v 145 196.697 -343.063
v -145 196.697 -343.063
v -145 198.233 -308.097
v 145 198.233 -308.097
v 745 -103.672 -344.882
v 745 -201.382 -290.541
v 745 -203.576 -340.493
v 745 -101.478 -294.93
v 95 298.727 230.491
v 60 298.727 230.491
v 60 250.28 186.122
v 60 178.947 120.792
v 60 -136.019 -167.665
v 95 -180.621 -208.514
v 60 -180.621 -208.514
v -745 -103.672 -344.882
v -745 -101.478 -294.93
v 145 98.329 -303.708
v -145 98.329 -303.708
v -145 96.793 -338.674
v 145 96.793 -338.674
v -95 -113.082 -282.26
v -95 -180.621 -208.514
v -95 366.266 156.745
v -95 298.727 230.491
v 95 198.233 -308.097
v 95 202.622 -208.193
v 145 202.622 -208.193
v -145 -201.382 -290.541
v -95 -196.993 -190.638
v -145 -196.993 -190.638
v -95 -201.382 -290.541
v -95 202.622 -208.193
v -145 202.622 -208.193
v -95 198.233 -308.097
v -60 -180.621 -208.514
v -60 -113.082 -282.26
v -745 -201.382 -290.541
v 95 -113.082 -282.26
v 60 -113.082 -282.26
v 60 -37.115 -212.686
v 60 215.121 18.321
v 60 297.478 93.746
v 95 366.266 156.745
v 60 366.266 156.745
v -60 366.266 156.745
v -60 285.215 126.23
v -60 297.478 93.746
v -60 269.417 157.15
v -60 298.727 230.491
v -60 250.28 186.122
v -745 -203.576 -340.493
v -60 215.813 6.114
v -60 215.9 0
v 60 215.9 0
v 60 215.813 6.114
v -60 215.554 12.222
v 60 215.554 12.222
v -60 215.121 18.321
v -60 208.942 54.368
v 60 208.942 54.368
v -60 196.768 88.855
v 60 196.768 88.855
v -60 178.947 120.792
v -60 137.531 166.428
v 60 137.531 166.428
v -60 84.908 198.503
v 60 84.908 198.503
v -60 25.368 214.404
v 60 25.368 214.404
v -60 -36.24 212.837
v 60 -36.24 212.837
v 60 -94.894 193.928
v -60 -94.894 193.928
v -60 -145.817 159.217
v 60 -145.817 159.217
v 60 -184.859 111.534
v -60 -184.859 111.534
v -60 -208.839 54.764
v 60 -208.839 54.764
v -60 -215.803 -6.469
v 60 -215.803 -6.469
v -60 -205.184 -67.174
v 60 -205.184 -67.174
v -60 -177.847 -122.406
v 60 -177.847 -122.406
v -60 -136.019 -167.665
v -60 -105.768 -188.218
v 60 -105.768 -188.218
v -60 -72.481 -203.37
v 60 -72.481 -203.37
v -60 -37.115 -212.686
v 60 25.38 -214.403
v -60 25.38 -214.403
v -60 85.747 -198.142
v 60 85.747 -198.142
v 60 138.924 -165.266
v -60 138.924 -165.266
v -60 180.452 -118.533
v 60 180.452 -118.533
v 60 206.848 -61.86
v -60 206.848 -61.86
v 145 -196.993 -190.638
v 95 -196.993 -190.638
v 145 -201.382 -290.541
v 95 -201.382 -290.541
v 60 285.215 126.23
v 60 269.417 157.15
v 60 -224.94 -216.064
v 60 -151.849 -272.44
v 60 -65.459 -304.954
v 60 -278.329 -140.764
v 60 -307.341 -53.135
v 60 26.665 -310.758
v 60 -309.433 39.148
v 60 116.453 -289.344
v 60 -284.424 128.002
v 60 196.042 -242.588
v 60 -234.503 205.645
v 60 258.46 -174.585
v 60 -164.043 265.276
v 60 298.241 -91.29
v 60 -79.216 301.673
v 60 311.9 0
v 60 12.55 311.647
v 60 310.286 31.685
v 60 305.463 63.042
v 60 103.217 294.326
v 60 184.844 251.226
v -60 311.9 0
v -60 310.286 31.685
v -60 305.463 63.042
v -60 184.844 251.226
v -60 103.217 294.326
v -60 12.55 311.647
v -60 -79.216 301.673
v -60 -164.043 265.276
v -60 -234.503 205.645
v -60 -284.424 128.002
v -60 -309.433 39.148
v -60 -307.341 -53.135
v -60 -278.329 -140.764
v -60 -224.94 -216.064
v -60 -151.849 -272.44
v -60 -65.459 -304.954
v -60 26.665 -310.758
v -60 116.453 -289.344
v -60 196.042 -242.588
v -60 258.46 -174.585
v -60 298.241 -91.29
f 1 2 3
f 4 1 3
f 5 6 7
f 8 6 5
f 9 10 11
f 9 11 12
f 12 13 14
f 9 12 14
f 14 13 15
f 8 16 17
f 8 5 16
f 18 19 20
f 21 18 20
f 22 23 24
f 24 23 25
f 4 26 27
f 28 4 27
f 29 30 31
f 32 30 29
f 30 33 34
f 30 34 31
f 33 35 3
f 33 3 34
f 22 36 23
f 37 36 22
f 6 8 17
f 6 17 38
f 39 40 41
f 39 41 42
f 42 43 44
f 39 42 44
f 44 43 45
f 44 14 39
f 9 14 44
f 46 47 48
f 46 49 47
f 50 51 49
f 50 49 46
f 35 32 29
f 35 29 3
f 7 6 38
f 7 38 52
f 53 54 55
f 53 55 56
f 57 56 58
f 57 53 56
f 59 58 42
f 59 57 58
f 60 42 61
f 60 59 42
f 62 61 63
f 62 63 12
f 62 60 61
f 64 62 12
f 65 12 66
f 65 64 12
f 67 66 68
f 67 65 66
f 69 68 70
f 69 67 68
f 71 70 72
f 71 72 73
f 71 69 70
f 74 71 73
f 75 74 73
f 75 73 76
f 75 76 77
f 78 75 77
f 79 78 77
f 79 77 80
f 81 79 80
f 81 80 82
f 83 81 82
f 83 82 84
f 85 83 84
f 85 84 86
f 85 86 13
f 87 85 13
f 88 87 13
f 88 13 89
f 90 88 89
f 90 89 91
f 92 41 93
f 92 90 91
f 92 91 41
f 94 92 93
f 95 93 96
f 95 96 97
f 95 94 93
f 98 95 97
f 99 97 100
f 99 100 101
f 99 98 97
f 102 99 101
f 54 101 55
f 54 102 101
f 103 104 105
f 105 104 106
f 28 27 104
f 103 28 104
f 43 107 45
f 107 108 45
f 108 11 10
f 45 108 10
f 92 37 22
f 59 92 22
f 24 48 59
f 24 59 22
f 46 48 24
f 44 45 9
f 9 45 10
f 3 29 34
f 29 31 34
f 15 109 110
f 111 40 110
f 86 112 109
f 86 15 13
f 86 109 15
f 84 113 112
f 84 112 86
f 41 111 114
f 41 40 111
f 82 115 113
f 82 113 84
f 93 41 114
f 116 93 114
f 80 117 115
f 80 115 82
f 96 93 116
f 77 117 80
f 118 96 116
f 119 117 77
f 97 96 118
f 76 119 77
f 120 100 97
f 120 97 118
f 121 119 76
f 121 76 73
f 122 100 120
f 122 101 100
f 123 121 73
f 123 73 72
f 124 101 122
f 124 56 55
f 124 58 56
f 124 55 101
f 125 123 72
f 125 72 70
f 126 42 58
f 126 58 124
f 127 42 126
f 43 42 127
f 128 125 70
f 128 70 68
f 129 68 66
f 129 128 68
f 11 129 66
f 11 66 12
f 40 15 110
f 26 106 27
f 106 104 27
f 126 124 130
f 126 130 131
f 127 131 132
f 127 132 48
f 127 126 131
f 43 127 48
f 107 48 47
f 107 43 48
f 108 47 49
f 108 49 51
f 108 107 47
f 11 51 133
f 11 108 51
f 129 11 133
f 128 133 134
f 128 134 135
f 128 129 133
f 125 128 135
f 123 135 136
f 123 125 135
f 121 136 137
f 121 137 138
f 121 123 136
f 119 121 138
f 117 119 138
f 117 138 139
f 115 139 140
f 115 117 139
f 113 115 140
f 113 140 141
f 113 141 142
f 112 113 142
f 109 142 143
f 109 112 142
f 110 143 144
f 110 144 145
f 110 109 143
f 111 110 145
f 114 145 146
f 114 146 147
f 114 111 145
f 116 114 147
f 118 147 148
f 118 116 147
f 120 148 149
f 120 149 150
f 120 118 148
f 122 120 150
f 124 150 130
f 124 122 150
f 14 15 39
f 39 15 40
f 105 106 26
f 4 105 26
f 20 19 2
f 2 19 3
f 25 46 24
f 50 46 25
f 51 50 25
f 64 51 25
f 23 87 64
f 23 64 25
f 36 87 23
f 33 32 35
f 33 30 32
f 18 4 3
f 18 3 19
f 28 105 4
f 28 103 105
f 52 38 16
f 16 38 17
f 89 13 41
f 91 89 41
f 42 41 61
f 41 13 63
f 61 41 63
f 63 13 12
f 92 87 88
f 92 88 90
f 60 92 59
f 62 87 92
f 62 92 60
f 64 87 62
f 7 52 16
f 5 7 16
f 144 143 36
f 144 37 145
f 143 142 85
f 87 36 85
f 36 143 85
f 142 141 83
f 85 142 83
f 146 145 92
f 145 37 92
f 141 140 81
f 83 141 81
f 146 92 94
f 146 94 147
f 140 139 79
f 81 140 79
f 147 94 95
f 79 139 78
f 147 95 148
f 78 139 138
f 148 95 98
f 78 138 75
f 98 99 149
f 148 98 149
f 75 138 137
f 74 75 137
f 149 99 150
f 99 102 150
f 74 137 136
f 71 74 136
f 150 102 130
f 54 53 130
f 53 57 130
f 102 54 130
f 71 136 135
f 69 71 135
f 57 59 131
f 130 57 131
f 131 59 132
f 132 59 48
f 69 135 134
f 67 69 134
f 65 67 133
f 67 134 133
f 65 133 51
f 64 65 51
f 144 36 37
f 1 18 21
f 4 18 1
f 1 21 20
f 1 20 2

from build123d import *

# Parameters (mm, degrees)
F0_R      = 311.9
F0_R_2    = 215.9
F1_DEPTH  = 60
F3_DEPTH  = 745
F5_DEPTH  = 35
F8_DEPTH  = 50
F11_DEPTH = 290


with BuildPart() as f1:
    # F0 (on Right) → F1 (new body, symmetric)
    with BuildSketch(Plane.YZ):
        Circle(F0_R)
        Circle(F0_R_2, mode=Mode.SUBTRACT)
    extrude(amount=F1_DEPTH, both=True)



with BuildPart() as f3:
    # F2 (on Right) → F3 (new body, symmetric)
    with BuildSketch(Plane.YZ):
        Polygon((-103.6724866617, -344.8819967158), (-101.4780894085, -294.9301737191), (-201.381735402, -290.5413792128), (-203.5761326551, -340.4932022095), align=None)
    extrude(amount=F3_DEPTH, both=True)


with BuildPart() as f5:
    # F4 (on face) → F5 (new body)
    with BuildSketch(Plane.YZ.offset(60)):
        Polygon((298.7269320486, 230.4909768651), (-180.6213653268, -208.5138178733), (-113.0821661363, -282.2597097772), (366.2661312391, 156.7450849612), align=None)
    extrude(amount=F5_DEPTH)


with BuildPart() as f1_1:
    add(f1.part)

    add(f5.part)  # F6 merges F5
    # F6: F5 across plane
    add(f5.part.mirror(Plane.YZ))


with BuildPart() as f8:
    # F7 (on face) → F8 (new body)
    with BuildSketch(Plane.YZ.offset(95)):
        Polygon((-201.381735402, -290.5413792128), (-101.4780894085, -294.9301737191), (198.2328485718, -308.0965572382), (202.6216430781, -208.1929112448), (-196.9929408956, -190.6377332193), align=None)
    extrude(amount=F8_DEPTH)


with BuildPart() as f9_1:
    # F9: instance of F8
    add(f8.part.mirror(Plane.YZ))


with BuildPart() as f11:
    # F10 (on face) → F11 (new body, through all)
    with BuildSketch(Plane.YZ.offset(145)):
        Polygon((198.2328485718, -308.0965572382), (98.3292025783, -303.7077627319), (96.7931245011, -338.6740388296), (196.6967704945, -343.0628333359), align=None)
    extrude(amount=-F11_DEPTH)


solid = Compound([f3.part, f1_1.part, f8.part, f9_1.part, f11.part])
